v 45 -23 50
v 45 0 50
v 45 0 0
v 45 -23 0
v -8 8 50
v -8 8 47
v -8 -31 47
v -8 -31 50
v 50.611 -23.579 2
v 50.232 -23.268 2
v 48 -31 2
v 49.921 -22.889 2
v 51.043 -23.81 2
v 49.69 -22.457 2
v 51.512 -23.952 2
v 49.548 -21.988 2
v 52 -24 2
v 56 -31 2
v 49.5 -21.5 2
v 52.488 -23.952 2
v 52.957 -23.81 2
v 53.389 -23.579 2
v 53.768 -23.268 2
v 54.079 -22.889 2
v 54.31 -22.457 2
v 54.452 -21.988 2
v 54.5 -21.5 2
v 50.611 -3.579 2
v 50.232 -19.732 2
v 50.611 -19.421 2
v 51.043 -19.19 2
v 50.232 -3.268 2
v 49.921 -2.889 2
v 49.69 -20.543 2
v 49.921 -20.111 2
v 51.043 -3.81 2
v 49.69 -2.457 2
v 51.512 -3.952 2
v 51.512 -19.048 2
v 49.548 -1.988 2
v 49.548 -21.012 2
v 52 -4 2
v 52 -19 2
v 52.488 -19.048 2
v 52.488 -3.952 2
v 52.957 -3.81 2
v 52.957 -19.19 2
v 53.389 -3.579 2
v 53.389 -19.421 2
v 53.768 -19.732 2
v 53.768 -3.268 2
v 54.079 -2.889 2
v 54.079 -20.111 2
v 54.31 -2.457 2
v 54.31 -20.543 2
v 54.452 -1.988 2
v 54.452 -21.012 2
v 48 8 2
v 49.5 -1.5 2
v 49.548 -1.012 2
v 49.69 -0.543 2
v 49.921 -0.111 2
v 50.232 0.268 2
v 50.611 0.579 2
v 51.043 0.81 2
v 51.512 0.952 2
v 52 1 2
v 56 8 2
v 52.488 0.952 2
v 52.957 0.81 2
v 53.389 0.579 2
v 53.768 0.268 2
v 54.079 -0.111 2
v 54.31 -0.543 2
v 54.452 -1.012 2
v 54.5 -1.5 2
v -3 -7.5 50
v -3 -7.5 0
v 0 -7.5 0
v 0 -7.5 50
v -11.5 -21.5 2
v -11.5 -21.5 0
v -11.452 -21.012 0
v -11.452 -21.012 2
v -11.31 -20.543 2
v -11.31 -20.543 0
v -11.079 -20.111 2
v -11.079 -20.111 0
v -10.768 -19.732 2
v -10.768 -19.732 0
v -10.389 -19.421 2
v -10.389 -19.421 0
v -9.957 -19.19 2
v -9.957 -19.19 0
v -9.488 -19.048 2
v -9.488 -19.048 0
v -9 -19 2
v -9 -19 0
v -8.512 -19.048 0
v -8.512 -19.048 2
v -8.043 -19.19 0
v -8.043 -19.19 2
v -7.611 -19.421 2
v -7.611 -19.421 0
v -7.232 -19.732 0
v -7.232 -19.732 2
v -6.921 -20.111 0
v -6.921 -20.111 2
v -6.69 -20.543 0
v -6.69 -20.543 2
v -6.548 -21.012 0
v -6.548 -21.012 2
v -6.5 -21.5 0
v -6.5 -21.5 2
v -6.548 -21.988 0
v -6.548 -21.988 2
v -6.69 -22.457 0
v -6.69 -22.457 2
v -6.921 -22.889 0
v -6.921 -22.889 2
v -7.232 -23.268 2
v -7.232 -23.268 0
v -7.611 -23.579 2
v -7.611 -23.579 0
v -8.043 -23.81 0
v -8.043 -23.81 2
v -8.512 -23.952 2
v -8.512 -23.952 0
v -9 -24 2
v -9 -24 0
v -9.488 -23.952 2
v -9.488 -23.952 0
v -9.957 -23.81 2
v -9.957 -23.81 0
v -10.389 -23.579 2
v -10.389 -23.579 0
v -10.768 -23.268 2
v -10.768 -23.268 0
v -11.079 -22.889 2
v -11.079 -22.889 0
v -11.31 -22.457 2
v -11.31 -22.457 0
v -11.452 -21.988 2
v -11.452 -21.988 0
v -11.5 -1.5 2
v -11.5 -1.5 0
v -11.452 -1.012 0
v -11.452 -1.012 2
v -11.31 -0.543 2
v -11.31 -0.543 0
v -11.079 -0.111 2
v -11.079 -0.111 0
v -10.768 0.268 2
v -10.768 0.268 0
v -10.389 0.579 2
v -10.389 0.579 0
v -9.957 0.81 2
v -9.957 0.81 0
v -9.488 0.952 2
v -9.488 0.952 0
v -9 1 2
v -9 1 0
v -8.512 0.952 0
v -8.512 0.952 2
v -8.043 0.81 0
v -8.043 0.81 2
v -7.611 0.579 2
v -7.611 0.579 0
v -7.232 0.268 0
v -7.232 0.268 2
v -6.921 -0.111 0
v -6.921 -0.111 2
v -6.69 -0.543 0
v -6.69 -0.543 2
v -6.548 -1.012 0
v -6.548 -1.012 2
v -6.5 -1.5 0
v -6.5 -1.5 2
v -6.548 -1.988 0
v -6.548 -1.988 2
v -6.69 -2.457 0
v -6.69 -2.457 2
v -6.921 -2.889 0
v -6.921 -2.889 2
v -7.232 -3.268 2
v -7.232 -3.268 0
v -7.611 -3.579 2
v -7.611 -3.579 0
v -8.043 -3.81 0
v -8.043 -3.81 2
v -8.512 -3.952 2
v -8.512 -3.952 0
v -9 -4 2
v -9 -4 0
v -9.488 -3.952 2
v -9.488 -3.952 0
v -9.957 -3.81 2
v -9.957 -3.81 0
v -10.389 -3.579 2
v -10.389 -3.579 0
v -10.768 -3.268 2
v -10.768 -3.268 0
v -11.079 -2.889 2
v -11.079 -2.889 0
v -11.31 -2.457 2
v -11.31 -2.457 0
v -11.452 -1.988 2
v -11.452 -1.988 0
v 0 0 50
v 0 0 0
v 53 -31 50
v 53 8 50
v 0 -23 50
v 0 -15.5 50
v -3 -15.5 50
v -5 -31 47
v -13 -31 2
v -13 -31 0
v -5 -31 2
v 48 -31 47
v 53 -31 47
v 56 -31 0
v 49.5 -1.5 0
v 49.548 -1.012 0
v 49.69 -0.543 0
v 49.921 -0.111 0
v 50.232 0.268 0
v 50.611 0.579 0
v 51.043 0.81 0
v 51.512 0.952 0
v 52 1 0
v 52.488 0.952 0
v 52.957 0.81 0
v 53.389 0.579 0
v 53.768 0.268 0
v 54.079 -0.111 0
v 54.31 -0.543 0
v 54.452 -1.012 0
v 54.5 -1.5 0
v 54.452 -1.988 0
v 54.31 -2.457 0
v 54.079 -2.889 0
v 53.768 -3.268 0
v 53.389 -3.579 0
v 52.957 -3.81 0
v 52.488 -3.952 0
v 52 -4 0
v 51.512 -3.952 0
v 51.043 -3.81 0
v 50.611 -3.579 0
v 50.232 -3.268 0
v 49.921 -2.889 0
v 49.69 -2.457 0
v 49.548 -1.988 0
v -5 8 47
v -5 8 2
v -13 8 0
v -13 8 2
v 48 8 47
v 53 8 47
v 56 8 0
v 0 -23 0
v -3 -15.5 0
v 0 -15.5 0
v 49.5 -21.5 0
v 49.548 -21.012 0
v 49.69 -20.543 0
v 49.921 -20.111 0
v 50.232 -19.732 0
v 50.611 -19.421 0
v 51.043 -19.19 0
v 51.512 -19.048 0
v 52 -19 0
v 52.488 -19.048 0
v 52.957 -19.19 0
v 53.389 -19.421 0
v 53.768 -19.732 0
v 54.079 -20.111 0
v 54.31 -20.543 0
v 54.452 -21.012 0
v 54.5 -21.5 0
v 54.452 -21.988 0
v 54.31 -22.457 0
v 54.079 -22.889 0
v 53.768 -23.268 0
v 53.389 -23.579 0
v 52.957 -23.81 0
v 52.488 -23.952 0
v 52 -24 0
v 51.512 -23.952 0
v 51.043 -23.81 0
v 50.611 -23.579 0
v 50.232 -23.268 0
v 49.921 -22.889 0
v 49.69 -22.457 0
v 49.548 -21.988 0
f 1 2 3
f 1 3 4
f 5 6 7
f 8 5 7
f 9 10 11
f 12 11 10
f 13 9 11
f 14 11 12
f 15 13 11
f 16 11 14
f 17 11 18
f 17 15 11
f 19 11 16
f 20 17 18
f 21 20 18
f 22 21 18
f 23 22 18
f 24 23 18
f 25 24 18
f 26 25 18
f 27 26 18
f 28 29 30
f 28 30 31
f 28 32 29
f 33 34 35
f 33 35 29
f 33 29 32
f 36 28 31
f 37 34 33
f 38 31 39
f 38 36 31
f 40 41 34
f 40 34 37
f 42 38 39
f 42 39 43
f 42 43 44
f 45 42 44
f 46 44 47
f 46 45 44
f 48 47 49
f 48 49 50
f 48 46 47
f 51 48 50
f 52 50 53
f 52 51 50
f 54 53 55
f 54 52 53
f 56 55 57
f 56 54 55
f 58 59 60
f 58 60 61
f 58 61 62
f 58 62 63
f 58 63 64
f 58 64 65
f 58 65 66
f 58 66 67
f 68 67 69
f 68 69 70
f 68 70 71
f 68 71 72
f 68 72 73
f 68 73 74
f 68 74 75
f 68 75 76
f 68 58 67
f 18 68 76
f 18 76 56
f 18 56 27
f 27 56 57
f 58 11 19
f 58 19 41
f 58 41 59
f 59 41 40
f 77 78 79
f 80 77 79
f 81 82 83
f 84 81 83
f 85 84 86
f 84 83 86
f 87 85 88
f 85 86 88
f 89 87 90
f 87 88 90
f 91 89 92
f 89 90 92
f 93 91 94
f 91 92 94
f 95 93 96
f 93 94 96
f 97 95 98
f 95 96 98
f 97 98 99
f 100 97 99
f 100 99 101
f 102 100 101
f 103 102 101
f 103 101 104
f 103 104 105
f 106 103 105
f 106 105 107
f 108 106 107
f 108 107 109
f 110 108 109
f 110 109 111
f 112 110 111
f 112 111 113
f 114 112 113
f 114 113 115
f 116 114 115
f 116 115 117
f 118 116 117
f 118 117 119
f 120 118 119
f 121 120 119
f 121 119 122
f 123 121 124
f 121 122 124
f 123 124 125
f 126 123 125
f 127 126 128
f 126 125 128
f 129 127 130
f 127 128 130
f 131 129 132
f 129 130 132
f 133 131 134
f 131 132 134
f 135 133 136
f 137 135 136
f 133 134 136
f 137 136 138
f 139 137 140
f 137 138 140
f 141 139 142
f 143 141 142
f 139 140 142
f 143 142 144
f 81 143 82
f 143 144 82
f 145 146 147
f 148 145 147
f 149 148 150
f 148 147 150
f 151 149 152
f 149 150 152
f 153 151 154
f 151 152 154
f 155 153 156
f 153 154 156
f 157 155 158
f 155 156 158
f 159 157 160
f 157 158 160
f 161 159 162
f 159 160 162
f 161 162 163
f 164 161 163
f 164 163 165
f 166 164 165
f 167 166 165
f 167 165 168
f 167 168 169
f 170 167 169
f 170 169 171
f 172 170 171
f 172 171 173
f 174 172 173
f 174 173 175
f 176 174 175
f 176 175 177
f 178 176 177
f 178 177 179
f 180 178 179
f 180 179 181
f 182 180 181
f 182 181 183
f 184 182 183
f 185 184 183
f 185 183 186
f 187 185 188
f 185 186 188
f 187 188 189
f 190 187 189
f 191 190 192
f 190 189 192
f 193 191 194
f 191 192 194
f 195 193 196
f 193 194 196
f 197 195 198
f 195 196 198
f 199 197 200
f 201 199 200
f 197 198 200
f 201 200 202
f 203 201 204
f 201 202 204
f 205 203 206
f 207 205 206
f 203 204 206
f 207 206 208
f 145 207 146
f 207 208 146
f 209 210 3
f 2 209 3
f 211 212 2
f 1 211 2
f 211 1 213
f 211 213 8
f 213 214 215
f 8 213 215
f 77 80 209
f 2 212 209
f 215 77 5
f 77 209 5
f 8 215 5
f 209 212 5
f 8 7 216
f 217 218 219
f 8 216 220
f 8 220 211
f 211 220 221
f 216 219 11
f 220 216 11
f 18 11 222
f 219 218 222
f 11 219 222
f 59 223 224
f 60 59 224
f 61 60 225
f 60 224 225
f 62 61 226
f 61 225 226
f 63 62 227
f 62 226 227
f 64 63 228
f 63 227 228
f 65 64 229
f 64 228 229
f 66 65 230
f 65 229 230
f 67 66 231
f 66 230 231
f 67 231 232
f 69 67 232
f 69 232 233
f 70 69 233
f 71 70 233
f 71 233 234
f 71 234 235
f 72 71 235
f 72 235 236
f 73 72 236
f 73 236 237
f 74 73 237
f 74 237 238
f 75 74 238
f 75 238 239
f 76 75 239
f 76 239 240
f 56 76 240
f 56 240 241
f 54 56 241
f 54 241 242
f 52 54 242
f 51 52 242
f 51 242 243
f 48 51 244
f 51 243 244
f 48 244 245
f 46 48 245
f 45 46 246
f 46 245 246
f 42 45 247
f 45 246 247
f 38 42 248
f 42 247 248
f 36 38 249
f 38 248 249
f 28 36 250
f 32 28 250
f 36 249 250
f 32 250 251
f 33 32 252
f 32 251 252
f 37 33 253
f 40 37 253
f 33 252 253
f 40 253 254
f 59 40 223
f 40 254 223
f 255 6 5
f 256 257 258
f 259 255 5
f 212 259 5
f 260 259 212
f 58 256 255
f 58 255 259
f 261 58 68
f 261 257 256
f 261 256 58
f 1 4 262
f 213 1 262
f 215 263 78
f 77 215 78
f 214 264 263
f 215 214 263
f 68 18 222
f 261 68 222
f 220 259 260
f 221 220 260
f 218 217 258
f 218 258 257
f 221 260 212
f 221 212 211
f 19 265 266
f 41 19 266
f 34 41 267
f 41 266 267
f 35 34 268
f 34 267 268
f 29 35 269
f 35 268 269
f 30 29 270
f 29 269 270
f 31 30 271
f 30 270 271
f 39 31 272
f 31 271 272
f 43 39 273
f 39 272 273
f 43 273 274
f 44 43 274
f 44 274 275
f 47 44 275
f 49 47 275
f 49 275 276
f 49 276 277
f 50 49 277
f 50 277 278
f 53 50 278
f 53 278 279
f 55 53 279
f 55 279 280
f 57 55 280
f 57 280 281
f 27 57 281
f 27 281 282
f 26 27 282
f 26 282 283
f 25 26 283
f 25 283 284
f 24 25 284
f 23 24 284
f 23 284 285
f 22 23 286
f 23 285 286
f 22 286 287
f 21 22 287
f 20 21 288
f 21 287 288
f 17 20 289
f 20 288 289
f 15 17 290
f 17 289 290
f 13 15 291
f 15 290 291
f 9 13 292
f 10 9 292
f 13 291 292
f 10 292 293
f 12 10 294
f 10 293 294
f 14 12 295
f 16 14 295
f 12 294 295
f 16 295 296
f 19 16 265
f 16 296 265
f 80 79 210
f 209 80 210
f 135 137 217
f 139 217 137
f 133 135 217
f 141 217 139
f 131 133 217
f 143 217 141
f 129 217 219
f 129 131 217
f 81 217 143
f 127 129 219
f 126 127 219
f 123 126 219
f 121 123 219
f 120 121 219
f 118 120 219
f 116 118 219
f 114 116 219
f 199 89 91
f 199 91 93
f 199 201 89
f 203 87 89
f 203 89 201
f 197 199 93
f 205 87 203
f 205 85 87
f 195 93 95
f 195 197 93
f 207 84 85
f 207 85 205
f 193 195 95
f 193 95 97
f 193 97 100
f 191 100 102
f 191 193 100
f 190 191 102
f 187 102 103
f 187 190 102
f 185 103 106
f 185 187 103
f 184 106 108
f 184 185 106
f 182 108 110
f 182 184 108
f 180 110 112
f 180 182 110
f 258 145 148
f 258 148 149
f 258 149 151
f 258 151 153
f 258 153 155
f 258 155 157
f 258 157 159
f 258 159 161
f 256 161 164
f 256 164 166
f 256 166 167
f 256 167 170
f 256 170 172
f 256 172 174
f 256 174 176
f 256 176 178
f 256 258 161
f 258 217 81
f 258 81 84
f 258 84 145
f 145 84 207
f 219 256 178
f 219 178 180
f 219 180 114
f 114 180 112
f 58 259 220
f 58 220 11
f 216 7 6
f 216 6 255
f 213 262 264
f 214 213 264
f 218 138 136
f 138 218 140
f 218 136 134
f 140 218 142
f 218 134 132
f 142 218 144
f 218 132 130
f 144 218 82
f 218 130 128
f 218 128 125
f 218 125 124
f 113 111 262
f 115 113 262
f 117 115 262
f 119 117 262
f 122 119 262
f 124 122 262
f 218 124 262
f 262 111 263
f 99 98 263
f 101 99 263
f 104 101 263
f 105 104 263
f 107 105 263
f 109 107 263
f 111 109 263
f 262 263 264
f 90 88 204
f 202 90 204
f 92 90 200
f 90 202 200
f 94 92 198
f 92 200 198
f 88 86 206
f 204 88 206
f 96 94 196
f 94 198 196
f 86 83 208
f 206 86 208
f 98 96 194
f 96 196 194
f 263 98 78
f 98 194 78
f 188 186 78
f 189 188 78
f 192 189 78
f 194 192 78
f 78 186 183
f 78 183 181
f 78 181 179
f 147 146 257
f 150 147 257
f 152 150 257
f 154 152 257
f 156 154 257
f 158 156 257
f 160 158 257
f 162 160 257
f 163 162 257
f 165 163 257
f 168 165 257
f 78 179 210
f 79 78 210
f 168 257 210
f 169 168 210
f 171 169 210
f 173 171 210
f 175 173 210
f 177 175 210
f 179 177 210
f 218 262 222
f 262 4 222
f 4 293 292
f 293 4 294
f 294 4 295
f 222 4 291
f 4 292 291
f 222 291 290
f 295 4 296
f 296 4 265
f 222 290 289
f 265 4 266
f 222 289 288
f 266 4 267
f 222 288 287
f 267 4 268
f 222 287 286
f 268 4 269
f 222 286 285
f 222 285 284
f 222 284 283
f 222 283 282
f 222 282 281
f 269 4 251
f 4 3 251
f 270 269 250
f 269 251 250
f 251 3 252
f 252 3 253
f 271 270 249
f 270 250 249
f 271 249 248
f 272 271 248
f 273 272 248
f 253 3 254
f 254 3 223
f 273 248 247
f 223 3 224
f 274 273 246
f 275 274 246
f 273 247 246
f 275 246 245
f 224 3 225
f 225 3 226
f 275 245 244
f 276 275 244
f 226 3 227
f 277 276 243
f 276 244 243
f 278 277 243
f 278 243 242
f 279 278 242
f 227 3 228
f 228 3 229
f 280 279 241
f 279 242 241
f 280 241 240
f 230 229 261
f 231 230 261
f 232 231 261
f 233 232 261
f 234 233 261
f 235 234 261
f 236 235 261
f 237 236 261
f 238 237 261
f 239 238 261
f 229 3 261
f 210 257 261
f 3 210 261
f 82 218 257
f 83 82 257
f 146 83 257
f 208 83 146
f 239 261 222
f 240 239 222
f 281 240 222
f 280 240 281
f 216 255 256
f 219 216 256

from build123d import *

# Parameters (mm, degrees)
BOSS_EXTRUDE1_DEPTH = 50
SKETCH2_W           = 3
SKETCH2_H           = 45
CUT_EXTRUDE1_DEPTH  = 50
SKETCH3_W           = 2
SKETCH3_H           = 45
CUT_EXTRUDE2_DEPTH  = 83.643814046
SKETCH4_W           = 3
SKETCH4_H           = 2
BOSS_EXTRUDE2_DEPTH = 39
SKETCH5_W           = 8
SKETCH5_H           = 2
BOSS_EXTRUDE3_DEPTH = 39
CUT_EXTRUDE3_REACH  = 83.222
SKETCH6_R           = 2.5


with BuildPart() as part:
    # Sketch1 → Boss-Extrude1 (new body)
    with BuildSketch(Plane.XY):
        Polygon((-8, 8), (53, 8), (53, -31), (-8, -31), (-8, -23.5), (-8, 0.5), align=None)
        Polygon((0, 0), (45, 0), (45, -23), (0, -23), (0, -15.5), (-3, -15.5), (-3, -7.5), (0, -7.5), align=None, mode=Mode.SUBTRACT)
    extrude(amount=BOSS_EXTRUDE1_DEPTH)

    # Sketch2 → Cut-Extrude1 (cut)
    with BuildSketch(Plane(origin=(0, 8, 0), x_dir=(1, 0, 0), z_dir=(0, 1, 0))):
        with Locations((-6.5, -24.5)):
            Rectangle(SKETCH2_W, SKETCH2_H)
        with Locations((51.5, -24.5)):
            Rectangle(SKETCH2_W, SKETCH2_H)
    extrude(amount=-CUT_EXTRUDE1_DEPTH, mode=Mode.SUBTRACT)

    # Sketch3 → Cut-Extrude2 (cut, through all)
    with BuildSketch(Plane(origin=(0, 8, 0), x_dir=(1, 0, 0), z_dir=(0, 1, 0))):
        with Locations((49, -24.5)):
            Rectangle(SKETCH3_W, SKETCH3_H)
    extrude(amount=-CUT_EXTRUDE2_DEPTH, mode=Mode.SUBTRACT)

    # Sketch4 → Boss-Extrude2 (add)
    with BuildSketch(Plane(origin=(0, 8, 0), x_dir=(1, 0, 0), z_dir=(0, 1, 0))):
        with Locations((54.5, -1)):
            Rectangle(SKETCH4_W, SKETCH4_H)
    extrude(amount=-BOSS_EXTRUDE2_DEPTH)

    # Sketch5 → Boss-Extrude3 (add)
    with BuildSketch(Plane(origin=(0, 8, 0), x_dir=(1, 0, 0), z_dir=(0, 1, 0))):
        with Locations((-9, -1)):
            Rectangle(SKETCH5_W, SKETCH5_H)
    extrude(amount=-BOSS_EXTRUDE3_DEPTH)

    # Sketch6 → Cut-Extrude3 (cut, up to next)
    with BuildSketch(Plane(origin=(0, 0, 0), x_dir=(-1, 0, 0), z_dir=(0, 0, -1)), mode=Mode.PRIVATE) as cut_extrude3_sk1:
        with Locations((-52, -1.5)):
            Circle(SKETCH6_R)
    cut_extrude3_tool1 = extrude(cut_extrude3_sk1.sketch, amount=-CUT_EXTRUDE3_REACH, mode=Mode.PRIVATE) & part.part
    # Sketch6 → Cut-Extrude3 (cut, up to next)
    with BuildSketch(Plane(origin=(0, 0, 0), x_dir=(-1, 0, 0), z_dir=(0, 0, -1)), mode=Mode.PRIVATE) as cut_extrude3_sk2:
        with Locations((-52, -21.5)):
            Circle(SKETCH6_R)
    cut_extrude3_tool2 = extrude(cut_extrude3_sk2.sketch, amount=-CUT_EXTRUDE3_REACH, mode=Mode.PRIVATE) & part.part
    # Sketch6 → Cut-Extrude3 (cut, up to next)
    with BuildSketch(Plane(origin=(0, 0, 0), x_dir=(-1, 0, 0), z_dir=(0, 0, -1)), mode=Mode.PRIVATE) as cut_extrude3_sk3:
        with Locations((9, -21.5)):
            Circle(SKETCH6_R)
    cut_extrude3_tool3 = extrude(cut_extrude3_sk3.sketch, amount=-CUT_EXTRUDE3_REACH, mode=Mode.PRIVATE) & part.part
    # Sketch6 → Cut-Extrude3 (cut, up to next)
    with BuildSketch(Plane(origin=(0, 0, 0), x_dir=(-1, 0, 0), z_dir=(0, 0, -1)), mode=Mode.PRIVATE) as cut_extrude3_sk4:
        with Locations((9, -1.5)):
            Circle(SKETCH6_R)
    cut_extrude3_tool4 = extrude(cut_extrude3_sk4.sketch, amount=-CUT_EXTRUDE3_REACH, mode=Mode.PRIVATE) & part.part
    add(cut_extrude3_tool1.solids().sort_by_distance((52, -1.5, 0))[0], mode=Mode.SUBTRACT)
    add(cut_extrude3_tool2.solids().sort_by_distance((52, -21.5, 0))[0], mode=Mode.SUBTRACT)
    add(cut_extrude3_tool3.solids().sort_by_distance((-9, -21.5, 0))[0], mode=Mode.SUBTRACT)
    add(cut_extrude3_tool4.solids().sort_by_distance((-9, -1.5, 0))[0], mode=Mode.SUBTRACT)


solid = part.part
